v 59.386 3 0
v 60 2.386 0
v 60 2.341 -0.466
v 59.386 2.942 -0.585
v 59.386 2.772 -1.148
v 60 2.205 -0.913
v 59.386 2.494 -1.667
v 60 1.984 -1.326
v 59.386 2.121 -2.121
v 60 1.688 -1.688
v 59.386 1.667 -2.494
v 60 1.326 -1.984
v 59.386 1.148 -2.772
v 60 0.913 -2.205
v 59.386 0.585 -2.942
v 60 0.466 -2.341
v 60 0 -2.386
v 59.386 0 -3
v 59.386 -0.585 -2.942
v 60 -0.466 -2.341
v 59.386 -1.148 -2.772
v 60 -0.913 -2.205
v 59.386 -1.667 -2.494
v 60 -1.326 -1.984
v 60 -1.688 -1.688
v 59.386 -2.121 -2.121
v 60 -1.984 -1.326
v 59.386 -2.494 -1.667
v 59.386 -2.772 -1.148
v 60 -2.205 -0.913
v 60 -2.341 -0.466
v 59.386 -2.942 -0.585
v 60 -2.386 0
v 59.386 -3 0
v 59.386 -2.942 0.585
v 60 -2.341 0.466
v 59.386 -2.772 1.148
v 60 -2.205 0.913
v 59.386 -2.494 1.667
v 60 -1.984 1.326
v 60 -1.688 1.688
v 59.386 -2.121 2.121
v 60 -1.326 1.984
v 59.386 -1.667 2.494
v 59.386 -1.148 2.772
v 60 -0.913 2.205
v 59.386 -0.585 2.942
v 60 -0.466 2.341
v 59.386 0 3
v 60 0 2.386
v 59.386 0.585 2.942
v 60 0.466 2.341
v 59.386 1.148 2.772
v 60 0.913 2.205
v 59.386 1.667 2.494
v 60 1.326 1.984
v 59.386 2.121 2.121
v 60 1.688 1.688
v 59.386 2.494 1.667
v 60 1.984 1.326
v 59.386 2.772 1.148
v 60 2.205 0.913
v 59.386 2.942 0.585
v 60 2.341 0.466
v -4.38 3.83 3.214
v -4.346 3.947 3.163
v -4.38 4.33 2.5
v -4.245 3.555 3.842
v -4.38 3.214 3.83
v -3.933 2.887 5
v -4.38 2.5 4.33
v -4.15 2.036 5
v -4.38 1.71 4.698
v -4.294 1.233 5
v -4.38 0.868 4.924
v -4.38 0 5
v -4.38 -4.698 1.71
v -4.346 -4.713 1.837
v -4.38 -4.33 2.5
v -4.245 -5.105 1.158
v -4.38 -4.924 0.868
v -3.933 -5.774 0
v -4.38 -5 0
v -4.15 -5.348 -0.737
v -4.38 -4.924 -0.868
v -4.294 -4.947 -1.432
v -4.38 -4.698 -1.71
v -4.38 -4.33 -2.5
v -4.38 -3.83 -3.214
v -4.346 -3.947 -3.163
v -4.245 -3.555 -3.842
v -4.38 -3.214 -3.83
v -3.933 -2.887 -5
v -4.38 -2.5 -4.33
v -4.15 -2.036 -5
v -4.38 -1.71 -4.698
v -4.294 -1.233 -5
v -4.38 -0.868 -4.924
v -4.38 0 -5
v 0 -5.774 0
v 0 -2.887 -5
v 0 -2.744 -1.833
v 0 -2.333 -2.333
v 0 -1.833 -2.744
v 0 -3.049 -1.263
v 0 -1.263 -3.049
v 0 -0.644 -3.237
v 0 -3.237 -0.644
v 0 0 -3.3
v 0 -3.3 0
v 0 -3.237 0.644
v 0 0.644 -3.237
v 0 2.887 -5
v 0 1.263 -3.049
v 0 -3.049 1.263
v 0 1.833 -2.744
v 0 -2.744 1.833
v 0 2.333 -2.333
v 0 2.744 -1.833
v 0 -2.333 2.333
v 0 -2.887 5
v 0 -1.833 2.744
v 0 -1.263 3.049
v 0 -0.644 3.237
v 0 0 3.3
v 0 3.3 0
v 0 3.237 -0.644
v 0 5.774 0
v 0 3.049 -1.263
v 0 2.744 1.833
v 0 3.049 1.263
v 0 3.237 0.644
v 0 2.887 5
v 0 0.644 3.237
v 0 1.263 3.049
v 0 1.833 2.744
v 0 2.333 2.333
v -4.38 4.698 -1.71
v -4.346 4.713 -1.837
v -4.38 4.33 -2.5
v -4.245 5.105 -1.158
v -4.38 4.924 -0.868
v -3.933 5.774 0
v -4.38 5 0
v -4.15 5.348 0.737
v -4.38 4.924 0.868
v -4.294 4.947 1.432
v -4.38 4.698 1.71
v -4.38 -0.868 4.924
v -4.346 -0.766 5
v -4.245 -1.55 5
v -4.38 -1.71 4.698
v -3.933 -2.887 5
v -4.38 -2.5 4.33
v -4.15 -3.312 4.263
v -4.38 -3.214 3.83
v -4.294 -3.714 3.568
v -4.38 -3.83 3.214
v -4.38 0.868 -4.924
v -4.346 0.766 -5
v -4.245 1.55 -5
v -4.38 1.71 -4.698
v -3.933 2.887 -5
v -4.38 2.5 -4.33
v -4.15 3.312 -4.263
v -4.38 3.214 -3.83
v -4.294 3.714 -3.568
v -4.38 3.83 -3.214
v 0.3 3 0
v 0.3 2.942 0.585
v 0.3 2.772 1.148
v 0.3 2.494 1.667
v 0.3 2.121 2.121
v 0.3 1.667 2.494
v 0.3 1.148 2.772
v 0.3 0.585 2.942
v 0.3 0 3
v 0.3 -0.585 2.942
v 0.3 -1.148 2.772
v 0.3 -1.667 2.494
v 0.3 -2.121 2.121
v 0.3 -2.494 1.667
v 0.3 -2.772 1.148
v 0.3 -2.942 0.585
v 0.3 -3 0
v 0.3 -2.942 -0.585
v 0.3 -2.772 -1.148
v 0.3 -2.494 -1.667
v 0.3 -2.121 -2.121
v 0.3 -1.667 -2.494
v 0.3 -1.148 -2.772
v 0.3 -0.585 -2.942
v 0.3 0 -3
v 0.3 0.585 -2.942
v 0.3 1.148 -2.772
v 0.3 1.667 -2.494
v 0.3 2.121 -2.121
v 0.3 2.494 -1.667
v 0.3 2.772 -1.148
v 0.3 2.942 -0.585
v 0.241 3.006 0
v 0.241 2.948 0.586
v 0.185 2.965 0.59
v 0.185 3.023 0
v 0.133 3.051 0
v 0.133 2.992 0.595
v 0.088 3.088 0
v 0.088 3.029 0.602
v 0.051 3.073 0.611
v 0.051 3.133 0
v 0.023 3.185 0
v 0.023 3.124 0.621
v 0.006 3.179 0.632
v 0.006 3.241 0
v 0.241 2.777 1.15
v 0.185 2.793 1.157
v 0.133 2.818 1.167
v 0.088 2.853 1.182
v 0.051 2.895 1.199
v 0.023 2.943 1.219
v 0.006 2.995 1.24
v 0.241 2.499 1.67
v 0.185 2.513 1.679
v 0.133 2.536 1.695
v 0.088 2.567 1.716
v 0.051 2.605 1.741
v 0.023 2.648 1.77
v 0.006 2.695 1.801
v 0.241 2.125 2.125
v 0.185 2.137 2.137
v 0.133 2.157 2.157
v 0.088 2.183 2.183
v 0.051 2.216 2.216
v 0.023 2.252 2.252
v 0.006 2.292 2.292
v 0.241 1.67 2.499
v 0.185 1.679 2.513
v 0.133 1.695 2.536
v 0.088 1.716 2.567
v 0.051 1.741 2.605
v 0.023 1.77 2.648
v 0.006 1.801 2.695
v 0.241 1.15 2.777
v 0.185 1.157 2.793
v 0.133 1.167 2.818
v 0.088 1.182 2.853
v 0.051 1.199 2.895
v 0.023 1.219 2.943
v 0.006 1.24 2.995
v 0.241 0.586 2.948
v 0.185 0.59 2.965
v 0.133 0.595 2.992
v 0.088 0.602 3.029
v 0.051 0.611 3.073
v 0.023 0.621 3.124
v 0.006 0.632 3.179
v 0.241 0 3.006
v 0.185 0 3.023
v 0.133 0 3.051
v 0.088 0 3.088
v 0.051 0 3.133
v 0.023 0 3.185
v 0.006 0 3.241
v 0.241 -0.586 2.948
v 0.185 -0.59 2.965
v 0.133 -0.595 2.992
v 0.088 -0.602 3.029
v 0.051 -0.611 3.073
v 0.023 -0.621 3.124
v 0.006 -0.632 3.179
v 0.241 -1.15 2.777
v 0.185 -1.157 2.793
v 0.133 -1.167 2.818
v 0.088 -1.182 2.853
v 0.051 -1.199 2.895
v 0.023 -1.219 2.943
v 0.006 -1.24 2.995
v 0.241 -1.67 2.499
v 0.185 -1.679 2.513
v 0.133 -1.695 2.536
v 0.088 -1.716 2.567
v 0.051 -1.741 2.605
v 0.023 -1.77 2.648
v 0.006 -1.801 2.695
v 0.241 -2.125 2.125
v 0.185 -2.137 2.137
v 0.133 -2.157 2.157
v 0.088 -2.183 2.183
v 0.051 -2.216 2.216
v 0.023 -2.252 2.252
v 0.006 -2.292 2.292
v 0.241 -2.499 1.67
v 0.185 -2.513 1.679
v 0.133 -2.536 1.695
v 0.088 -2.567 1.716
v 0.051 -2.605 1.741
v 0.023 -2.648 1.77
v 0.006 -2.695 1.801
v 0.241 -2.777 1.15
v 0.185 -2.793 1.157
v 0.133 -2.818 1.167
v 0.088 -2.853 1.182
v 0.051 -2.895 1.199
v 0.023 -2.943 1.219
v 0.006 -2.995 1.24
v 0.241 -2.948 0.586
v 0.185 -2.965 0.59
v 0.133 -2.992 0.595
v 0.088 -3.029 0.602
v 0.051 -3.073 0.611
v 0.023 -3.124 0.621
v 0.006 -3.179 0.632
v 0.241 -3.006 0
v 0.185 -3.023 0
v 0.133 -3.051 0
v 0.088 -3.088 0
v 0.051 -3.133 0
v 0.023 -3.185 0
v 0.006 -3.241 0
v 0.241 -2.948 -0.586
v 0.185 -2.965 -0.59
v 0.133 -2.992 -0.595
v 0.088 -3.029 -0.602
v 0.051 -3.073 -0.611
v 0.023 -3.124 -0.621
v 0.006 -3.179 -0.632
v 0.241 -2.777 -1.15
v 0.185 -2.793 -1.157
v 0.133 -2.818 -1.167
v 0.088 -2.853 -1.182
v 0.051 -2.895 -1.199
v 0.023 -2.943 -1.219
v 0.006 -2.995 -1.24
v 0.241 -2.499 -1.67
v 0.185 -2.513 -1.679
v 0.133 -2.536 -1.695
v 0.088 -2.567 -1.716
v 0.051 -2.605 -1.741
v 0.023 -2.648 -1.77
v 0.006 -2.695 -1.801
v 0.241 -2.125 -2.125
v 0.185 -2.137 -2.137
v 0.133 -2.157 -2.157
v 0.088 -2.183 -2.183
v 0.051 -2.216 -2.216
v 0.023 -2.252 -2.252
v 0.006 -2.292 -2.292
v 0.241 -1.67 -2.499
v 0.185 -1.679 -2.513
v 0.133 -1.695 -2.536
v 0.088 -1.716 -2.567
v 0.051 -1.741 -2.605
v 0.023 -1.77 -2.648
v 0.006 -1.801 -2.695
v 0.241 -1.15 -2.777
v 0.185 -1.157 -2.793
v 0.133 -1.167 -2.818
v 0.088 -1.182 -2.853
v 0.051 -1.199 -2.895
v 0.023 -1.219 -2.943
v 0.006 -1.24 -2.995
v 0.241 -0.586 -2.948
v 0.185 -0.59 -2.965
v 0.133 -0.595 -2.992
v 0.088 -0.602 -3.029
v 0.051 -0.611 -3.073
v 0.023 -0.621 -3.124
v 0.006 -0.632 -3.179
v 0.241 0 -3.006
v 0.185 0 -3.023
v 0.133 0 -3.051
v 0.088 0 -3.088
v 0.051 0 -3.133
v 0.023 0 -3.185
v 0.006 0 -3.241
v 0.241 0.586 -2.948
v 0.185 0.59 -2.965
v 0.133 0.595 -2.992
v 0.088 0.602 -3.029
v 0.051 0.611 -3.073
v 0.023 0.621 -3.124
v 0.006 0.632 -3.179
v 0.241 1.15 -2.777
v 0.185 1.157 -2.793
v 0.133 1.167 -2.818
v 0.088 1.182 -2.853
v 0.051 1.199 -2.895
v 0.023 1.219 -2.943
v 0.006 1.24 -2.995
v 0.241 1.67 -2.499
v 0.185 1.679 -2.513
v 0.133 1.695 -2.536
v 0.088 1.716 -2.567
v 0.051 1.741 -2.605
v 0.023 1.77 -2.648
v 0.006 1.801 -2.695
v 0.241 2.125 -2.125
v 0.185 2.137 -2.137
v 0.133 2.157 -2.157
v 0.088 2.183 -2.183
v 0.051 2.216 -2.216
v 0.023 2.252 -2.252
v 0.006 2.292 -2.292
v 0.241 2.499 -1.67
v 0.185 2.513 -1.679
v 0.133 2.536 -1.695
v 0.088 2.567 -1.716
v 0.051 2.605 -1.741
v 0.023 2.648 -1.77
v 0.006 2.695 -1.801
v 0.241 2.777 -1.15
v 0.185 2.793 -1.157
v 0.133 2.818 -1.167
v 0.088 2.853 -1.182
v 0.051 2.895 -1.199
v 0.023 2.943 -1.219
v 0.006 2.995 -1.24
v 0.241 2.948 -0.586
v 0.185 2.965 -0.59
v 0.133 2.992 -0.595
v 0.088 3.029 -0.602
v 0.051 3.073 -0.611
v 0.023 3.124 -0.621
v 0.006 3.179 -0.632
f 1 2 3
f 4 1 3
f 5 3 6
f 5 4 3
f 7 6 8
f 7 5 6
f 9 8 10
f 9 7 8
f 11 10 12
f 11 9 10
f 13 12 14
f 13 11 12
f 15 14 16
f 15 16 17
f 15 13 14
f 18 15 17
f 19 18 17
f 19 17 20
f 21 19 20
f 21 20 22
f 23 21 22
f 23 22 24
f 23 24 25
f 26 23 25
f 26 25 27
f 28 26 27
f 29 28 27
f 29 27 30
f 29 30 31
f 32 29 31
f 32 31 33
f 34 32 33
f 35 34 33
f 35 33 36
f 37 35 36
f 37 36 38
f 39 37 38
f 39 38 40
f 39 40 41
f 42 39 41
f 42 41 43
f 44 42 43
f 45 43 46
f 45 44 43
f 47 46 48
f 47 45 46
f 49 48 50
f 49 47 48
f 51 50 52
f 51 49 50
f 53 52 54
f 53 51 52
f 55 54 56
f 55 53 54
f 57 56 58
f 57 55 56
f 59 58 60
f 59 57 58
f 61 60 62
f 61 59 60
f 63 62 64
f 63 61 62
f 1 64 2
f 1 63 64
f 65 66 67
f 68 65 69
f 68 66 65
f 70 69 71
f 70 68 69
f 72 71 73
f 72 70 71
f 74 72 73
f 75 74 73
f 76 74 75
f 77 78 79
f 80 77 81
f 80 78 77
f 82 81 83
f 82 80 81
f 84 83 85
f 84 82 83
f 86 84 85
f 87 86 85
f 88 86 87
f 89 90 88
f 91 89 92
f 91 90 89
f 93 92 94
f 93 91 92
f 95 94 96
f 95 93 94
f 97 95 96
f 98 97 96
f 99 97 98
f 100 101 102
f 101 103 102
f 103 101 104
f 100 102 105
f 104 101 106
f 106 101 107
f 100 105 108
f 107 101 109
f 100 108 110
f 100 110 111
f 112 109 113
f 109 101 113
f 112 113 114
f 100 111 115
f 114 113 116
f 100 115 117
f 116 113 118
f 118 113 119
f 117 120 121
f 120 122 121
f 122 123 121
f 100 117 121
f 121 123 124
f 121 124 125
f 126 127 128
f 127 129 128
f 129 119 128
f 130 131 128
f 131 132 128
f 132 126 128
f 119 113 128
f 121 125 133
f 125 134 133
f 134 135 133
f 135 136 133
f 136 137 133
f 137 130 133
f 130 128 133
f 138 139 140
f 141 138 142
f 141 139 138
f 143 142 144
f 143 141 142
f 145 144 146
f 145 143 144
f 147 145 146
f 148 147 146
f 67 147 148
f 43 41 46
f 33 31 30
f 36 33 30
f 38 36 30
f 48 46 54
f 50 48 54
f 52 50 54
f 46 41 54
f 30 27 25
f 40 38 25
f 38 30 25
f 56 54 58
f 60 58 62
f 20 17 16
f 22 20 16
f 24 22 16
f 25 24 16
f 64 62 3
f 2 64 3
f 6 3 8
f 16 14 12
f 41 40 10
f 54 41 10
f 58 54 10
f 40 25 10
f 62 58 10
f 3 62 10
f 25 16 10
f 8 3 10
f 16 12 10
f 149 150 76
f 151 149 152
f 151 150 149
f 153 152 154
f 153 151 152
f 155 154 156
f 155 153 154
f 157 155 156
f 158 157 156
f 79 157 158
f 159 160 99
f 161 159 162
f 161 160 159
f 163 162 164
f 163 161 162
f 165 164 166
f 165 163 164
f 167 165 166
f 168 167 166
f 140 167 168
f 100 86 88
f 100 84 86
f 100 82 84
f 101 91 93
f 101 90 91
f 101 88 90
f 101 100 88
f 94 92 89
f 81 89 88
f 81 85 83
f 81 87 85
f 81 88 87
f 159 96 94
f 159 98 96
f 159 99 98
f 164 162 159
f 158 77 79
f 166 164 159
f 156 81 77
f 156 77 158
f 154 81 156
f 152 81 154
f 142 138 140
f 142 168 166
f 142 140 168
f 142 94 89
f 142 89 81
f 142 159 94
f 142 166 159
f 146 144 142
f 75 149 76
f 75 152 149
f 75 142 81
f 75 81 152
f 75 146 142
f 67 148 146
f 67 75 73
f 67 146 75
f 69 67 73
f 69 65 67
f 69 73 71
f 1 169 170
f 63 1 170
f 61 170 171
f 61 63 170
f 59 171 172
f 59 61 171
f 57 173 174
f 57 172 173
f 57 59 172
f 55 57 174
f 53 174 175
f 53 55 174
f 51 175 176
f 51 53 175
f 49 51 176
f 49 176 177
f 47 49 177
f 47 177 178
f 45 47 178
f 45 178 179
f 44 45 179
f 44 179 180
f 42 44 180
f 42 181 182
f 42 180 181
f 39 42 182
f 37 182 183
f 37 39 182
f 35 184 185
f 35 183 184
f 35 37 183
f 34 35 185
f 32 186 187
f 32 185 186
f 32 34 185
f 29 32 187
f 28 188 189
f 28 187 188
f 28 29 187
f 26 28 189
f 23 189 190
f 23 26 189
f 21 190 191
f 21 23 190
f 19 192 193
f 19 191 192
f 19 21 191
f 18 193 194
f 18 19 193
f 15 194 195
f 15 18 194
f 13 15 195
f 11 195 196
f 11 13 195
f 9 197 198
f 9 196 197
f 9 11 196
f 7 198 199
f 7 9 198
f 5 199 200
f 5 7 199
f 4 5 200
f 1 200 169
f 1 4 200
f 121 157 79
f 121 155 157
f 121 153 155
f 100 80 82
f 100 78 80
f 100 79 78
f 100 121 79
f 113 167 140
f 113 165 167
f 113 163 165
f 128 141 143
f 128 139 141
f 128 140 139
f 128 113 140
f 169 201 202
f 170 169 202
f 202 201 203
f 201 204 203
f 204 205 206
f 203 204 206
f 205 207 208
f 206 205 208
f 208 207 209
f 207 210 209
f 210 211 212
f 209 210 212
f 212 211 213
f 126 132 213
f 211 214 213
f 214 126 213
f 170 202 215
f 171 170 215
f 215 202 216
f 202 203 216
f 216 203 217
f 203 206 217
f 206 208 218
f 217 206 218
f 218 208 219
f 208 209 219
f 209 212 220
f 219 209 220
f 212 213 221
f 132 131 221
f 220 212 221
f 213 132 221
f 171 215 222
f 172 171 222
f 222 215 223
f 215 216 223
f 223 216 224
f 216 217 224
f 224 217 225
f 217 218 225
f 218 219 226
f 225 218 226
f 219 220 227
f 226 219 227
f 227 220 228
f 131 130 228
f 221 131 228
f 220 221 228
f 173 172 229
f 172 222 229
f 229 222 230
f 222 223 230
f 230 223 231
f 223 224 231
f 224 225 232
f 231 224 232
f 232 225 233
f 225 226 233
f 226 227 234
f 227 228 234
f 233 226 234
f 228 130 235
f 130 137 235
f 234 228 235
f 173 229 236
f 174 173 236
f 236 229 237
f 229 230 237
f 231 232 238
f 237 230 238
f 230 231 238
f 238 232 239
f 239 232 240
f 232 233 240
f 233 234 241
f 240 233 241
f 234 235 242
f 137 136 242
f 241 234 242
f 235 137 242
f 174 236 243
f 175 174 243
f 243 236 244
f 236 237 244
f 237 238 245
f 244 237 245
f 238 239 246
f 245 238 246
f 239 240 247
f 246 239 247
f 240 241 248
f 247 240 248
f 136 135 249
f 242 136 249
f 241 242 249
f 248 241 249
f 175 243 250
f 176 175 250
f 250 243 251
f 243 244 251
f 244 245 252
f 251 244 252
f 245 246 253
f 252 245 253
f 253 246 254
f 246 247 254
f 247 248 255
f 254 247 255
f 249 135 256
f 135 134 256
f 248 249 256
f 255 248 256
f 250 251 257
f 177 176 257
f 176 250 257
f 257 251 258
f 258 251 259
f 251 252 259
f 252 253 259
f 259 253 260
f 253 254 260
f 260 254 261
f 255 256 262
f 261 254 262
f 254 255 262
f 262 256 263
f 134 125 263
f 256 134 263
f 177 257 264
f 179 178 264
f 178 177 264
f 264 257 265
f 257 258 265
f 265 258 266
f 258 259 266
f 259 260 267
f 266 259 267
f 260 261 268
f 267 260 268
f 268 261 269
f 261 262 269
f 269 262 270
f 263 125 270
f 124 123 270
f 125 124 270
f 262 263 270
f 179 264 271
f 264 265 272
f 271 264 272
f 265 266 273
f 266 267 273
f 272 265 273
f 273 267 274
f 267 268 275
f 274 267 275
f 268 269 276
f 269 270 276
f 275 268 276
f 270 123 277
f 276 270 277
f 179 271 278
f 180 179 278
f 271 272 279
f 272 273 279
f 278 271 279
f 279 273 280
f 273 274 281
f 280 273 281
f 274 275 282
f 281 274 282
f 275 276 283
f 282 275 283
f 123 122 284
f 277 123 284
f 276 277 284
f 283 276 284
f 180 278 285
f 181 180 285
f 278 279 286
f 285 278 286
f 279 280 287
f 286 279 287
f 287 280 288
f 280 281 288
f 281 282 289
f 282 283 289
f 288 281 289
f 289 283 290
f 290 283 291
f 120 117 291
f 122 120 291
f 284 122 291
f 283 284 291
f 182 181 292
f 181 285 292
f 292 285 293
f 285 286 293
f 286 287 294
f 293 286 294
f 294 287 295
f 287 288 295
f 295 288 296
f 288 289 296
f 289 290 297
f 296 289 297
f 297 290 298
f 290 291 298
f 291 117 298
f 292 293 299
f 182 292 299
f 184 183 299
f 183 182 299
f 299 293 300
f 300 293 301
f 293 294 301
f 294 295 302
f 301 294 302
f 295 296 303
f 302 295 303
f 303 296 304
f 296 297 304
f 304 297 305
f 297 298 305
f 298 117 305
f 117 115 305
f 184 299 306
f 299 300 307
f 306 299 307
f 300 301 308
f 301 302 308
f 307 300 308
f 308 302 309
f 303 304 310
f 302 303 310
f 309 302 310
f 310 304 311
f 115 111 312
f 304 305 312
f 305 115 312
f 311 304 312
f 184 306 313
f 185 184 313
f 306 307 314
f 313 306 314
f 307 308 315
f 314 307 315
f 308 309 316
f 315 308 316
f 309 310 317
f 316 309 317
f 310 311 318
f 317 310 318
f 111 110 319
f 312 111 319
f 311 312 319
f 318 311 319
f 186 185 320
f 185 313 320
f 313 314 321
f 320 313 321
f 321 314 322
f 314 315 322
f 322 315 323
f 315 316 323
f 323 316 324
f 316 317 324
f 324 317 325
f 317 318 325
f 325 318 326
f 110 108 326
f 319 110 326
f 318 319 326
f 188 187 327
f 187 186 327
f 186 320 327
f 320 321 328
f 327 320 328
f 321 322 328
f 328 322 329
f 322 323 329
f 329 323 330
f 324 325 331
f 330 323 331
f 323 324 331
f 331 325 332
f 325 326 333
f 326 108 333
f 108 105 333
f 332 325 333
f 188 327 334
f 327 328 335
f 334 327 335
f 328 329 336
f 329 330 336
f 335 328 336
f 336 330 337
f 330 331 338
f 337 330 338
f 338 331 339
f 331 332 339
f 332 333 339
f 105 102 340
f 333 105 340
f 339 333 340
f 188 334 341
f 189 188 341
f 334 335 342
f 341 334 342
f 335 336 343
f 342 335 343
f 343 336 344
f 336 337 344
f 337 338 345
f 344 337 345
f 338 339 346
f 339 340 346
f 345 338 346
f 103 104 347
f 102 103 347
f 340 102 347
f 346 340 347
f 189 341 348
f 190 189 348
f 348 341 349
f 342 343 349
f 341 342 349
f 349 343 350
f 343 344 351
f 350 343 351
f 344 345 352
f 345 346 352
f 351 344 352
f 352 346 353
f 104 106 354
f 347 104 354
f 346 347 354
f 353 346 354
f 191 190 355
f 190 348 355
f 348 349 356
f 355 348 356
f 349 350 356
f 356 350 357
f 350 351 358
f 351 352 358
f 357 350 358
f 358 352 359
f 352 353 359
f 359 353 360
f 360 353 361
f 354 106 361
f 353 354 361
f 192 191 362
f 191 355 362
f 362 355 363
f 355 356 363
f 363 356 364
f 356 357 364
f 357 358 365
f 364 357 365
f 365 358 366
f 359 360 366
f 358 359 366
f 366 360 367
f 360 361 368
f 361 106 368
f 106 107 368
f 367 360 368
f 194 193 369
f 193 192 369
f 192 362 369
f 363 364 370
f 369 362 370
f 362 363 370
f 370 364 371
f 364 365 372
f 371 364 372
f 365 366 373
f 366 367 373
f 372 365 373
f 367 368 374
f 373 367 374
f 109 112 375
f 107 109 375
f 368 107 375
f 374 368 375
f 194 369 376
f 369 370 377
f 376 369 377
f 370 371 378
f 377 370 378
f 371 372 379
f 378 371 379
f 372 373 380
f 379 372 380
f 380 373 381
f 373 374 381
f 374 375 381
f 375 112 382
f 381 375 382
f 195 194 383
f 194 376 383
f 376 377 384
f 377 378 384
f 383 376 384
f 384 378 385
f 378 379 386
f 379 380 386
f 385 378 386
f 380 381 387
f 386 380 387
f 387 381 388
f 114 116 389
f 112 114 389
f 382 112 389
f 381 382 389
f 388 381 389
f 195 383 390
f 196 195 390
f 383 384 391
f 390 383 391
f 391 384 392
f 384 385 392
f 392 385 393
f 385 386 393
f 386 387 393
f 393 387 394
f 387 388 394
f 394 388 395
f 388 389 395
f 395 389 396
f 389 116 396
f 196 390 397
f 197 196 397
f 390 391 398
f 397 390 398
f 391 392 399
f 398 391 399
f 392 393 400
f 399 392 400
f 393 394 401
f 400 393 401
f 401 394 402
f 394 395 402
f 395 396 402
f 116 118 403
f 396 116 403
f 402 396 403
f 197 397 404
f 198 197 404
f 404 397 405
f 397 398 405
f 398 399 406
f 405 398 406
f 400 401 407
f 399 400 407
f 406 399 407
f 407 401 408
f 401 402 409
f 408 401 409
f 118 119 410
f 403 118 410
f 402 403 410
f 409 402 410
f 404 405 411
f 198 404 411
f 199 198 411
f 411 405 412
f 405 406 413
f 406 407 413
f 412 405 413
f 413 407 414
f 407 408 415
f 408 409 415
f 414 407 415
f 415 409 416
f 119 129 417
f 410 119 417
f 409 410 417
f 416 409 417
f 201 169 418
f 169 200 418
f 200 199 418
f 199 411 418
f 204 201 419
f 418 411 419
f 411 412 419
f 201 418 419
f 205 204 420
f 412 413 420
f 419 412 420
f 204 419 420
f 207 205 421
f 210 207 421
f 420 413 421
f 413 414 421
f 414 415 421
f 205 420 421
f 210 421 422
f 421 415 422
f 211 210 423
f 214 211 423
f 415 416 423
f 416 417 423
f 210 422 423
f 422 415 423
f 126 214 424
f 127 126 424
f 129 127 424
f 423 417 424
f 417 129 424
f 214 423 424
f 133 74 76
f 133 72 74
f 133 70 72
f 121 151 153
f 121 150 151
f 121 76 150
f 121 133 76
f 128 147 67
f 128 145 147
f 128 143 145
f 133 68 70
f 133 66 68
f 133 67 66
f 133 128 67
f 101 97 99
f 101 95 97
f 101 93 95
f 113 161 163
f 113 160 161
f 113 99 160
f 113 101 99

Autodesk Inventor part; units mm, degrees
ref_plane "YZ Plane" through (0, 0, 0) normal (1, 0, 0) x (0, 1, 0)
ref_plane "XZ Plane" through (0, 0, 0) normal (0, 1, 0) x (-1, 0, 0)
sketch "Szkic1" plane through (0, 0, 0) normal (0, 0, 1) x (1, 0, 0)
  line L0 (0, 3) -> (60, 3)
  line L1 (60, 3) -> (60, 0)
  line L2 (60, 0) -> (0, 0)
  line L3 (-12, 0) -> (72, 0) projected
  line L4 (0, -0.6) -> (0, 3.6) projected
  line L5 (0, 3) -> (0, 0)
  dimension "d2" = 6
  dimension "d59" = 60
revolve "Bryła" add sketch "Szkic1" angle 360 about axis through (60, 0, 0) along (-1, 0, 0)
sketch "Szkic2" plane through (0, 0, 0) normal (-1, 0, 0) x (0, 0, 1)
  line L0 (0, 5.7735) -> (5, 2.8868)
  line L1 (5, 2.8868) -> (5, -2.8868)
  line L2 (5, -2.8868) -> (0, -5.7735)
  line L3 (0, -5.7735) -> (-5, -2.8868)
  line L4 (-5, -2.8868) -> (-5, 2.8868)
  line L5 (-5, 2.8868) -> (0, 5.7735)
  line L6 (-7, 0) -> (7, 0) projected
  line L7 (0, 8.0829) -> (0, -8.0829) projected
  point P0 (0, 0)
  point P1 (0, 0)
  dimension "d11" = 10
extrude "Głowica" add sketch "Szkic2" along normal blind 4.38
sketch "Szkic4" plane through (0, 0, 0) normal (0, 0, 1) x (1, 0, 0)
  line L0 (-3.8026, 6) -> (-4.38, 5)
  line L1 (-1.1, 0) -> (-0.234, 0)
  line L2 (-5.2092, 0) -> (0.5952, 0) projected
  line L3 (-4.38, 6) -> (-3.8026, 6)
  line L4 (-4.38, 5) -> (-4.38, 6)
  line L5 (0, 7.2) -> (0, -1.2) projected
  dimension "d65" = 10
  dimension "d67" = 30
  dimension "d68" = 12
  dimension "d69" = 4.38
revolve "Faza1" cut sketch "Szkic4" angle 360 about axis through (-1.1, 0, 0) along (1, 0, 0)
thread "Gwint" size "M6x1" class "6g" standard "ISO Metric profile" length 18
chamfer "Faza2" distance 0.6135 distance2 0.6136 1 edges at (60, -3, 0) measured on face at (60, 0.0929, 0.8807)
fillet "Fillet" radius 0.3 1 edges at (0, -3, 0)
ref_plane "Work Plane1" through (1.525, 0, 0) normal (0, 0, 1) x (1, 0, 0)
equation "\"d71\" = RR1"
equation "\"d11\" = SW"
equation "\"d3\" = KOH"
equation "\"d15\" = GEL"
equation "\"d6\" = -0.5 * SPD + 0.5 * GD"
equation "\"d2\" = GD"
equation "\"d59\" = NLG"
equation "\"d65\" = SW"
equation "\"d67\" = ANG1"
equation "\"d68\" = 1.2 * SW"
equation "\"d69\" = KOH"
equation "\"NLG\" = 60"
equation "\"GD\" = NND"
equation "\"BDM\" = NND"
equation "\"KOH\" = 4.38"
equation "\"GEL\" = 18"
equation "\"SW\" = 10"
equation "\"SPD\" = NND - 1.2269 * PTC"
equation "\"SD2\" = NND"
equation "\"SD\" = 0"
equation "\"ANG1\" = 30deg"
equation "\"GAL\" = 0.61345 * PTC"
equation "\"GUL\" = 0.61345 * PTC"
equation "\"RR\" = 0.1"
equation "\"RR1\" = 0.3"
equation "\"GD1\" = THREADDIA - 1.2269 * PTC"
equation "\"THREADDIA\" = 6"
equation "\"TOA\" = 30deg"
equation "\"PTC\" = 1"
equation "\"KOH1\" = 2.8"
equation "\"NND\" = 6"
equation "\"E0\" = 1.155 * SW"
properties part number "ANSI B18.2.3.5M - M6 x 1 x 60" material "Stal, miękka"
